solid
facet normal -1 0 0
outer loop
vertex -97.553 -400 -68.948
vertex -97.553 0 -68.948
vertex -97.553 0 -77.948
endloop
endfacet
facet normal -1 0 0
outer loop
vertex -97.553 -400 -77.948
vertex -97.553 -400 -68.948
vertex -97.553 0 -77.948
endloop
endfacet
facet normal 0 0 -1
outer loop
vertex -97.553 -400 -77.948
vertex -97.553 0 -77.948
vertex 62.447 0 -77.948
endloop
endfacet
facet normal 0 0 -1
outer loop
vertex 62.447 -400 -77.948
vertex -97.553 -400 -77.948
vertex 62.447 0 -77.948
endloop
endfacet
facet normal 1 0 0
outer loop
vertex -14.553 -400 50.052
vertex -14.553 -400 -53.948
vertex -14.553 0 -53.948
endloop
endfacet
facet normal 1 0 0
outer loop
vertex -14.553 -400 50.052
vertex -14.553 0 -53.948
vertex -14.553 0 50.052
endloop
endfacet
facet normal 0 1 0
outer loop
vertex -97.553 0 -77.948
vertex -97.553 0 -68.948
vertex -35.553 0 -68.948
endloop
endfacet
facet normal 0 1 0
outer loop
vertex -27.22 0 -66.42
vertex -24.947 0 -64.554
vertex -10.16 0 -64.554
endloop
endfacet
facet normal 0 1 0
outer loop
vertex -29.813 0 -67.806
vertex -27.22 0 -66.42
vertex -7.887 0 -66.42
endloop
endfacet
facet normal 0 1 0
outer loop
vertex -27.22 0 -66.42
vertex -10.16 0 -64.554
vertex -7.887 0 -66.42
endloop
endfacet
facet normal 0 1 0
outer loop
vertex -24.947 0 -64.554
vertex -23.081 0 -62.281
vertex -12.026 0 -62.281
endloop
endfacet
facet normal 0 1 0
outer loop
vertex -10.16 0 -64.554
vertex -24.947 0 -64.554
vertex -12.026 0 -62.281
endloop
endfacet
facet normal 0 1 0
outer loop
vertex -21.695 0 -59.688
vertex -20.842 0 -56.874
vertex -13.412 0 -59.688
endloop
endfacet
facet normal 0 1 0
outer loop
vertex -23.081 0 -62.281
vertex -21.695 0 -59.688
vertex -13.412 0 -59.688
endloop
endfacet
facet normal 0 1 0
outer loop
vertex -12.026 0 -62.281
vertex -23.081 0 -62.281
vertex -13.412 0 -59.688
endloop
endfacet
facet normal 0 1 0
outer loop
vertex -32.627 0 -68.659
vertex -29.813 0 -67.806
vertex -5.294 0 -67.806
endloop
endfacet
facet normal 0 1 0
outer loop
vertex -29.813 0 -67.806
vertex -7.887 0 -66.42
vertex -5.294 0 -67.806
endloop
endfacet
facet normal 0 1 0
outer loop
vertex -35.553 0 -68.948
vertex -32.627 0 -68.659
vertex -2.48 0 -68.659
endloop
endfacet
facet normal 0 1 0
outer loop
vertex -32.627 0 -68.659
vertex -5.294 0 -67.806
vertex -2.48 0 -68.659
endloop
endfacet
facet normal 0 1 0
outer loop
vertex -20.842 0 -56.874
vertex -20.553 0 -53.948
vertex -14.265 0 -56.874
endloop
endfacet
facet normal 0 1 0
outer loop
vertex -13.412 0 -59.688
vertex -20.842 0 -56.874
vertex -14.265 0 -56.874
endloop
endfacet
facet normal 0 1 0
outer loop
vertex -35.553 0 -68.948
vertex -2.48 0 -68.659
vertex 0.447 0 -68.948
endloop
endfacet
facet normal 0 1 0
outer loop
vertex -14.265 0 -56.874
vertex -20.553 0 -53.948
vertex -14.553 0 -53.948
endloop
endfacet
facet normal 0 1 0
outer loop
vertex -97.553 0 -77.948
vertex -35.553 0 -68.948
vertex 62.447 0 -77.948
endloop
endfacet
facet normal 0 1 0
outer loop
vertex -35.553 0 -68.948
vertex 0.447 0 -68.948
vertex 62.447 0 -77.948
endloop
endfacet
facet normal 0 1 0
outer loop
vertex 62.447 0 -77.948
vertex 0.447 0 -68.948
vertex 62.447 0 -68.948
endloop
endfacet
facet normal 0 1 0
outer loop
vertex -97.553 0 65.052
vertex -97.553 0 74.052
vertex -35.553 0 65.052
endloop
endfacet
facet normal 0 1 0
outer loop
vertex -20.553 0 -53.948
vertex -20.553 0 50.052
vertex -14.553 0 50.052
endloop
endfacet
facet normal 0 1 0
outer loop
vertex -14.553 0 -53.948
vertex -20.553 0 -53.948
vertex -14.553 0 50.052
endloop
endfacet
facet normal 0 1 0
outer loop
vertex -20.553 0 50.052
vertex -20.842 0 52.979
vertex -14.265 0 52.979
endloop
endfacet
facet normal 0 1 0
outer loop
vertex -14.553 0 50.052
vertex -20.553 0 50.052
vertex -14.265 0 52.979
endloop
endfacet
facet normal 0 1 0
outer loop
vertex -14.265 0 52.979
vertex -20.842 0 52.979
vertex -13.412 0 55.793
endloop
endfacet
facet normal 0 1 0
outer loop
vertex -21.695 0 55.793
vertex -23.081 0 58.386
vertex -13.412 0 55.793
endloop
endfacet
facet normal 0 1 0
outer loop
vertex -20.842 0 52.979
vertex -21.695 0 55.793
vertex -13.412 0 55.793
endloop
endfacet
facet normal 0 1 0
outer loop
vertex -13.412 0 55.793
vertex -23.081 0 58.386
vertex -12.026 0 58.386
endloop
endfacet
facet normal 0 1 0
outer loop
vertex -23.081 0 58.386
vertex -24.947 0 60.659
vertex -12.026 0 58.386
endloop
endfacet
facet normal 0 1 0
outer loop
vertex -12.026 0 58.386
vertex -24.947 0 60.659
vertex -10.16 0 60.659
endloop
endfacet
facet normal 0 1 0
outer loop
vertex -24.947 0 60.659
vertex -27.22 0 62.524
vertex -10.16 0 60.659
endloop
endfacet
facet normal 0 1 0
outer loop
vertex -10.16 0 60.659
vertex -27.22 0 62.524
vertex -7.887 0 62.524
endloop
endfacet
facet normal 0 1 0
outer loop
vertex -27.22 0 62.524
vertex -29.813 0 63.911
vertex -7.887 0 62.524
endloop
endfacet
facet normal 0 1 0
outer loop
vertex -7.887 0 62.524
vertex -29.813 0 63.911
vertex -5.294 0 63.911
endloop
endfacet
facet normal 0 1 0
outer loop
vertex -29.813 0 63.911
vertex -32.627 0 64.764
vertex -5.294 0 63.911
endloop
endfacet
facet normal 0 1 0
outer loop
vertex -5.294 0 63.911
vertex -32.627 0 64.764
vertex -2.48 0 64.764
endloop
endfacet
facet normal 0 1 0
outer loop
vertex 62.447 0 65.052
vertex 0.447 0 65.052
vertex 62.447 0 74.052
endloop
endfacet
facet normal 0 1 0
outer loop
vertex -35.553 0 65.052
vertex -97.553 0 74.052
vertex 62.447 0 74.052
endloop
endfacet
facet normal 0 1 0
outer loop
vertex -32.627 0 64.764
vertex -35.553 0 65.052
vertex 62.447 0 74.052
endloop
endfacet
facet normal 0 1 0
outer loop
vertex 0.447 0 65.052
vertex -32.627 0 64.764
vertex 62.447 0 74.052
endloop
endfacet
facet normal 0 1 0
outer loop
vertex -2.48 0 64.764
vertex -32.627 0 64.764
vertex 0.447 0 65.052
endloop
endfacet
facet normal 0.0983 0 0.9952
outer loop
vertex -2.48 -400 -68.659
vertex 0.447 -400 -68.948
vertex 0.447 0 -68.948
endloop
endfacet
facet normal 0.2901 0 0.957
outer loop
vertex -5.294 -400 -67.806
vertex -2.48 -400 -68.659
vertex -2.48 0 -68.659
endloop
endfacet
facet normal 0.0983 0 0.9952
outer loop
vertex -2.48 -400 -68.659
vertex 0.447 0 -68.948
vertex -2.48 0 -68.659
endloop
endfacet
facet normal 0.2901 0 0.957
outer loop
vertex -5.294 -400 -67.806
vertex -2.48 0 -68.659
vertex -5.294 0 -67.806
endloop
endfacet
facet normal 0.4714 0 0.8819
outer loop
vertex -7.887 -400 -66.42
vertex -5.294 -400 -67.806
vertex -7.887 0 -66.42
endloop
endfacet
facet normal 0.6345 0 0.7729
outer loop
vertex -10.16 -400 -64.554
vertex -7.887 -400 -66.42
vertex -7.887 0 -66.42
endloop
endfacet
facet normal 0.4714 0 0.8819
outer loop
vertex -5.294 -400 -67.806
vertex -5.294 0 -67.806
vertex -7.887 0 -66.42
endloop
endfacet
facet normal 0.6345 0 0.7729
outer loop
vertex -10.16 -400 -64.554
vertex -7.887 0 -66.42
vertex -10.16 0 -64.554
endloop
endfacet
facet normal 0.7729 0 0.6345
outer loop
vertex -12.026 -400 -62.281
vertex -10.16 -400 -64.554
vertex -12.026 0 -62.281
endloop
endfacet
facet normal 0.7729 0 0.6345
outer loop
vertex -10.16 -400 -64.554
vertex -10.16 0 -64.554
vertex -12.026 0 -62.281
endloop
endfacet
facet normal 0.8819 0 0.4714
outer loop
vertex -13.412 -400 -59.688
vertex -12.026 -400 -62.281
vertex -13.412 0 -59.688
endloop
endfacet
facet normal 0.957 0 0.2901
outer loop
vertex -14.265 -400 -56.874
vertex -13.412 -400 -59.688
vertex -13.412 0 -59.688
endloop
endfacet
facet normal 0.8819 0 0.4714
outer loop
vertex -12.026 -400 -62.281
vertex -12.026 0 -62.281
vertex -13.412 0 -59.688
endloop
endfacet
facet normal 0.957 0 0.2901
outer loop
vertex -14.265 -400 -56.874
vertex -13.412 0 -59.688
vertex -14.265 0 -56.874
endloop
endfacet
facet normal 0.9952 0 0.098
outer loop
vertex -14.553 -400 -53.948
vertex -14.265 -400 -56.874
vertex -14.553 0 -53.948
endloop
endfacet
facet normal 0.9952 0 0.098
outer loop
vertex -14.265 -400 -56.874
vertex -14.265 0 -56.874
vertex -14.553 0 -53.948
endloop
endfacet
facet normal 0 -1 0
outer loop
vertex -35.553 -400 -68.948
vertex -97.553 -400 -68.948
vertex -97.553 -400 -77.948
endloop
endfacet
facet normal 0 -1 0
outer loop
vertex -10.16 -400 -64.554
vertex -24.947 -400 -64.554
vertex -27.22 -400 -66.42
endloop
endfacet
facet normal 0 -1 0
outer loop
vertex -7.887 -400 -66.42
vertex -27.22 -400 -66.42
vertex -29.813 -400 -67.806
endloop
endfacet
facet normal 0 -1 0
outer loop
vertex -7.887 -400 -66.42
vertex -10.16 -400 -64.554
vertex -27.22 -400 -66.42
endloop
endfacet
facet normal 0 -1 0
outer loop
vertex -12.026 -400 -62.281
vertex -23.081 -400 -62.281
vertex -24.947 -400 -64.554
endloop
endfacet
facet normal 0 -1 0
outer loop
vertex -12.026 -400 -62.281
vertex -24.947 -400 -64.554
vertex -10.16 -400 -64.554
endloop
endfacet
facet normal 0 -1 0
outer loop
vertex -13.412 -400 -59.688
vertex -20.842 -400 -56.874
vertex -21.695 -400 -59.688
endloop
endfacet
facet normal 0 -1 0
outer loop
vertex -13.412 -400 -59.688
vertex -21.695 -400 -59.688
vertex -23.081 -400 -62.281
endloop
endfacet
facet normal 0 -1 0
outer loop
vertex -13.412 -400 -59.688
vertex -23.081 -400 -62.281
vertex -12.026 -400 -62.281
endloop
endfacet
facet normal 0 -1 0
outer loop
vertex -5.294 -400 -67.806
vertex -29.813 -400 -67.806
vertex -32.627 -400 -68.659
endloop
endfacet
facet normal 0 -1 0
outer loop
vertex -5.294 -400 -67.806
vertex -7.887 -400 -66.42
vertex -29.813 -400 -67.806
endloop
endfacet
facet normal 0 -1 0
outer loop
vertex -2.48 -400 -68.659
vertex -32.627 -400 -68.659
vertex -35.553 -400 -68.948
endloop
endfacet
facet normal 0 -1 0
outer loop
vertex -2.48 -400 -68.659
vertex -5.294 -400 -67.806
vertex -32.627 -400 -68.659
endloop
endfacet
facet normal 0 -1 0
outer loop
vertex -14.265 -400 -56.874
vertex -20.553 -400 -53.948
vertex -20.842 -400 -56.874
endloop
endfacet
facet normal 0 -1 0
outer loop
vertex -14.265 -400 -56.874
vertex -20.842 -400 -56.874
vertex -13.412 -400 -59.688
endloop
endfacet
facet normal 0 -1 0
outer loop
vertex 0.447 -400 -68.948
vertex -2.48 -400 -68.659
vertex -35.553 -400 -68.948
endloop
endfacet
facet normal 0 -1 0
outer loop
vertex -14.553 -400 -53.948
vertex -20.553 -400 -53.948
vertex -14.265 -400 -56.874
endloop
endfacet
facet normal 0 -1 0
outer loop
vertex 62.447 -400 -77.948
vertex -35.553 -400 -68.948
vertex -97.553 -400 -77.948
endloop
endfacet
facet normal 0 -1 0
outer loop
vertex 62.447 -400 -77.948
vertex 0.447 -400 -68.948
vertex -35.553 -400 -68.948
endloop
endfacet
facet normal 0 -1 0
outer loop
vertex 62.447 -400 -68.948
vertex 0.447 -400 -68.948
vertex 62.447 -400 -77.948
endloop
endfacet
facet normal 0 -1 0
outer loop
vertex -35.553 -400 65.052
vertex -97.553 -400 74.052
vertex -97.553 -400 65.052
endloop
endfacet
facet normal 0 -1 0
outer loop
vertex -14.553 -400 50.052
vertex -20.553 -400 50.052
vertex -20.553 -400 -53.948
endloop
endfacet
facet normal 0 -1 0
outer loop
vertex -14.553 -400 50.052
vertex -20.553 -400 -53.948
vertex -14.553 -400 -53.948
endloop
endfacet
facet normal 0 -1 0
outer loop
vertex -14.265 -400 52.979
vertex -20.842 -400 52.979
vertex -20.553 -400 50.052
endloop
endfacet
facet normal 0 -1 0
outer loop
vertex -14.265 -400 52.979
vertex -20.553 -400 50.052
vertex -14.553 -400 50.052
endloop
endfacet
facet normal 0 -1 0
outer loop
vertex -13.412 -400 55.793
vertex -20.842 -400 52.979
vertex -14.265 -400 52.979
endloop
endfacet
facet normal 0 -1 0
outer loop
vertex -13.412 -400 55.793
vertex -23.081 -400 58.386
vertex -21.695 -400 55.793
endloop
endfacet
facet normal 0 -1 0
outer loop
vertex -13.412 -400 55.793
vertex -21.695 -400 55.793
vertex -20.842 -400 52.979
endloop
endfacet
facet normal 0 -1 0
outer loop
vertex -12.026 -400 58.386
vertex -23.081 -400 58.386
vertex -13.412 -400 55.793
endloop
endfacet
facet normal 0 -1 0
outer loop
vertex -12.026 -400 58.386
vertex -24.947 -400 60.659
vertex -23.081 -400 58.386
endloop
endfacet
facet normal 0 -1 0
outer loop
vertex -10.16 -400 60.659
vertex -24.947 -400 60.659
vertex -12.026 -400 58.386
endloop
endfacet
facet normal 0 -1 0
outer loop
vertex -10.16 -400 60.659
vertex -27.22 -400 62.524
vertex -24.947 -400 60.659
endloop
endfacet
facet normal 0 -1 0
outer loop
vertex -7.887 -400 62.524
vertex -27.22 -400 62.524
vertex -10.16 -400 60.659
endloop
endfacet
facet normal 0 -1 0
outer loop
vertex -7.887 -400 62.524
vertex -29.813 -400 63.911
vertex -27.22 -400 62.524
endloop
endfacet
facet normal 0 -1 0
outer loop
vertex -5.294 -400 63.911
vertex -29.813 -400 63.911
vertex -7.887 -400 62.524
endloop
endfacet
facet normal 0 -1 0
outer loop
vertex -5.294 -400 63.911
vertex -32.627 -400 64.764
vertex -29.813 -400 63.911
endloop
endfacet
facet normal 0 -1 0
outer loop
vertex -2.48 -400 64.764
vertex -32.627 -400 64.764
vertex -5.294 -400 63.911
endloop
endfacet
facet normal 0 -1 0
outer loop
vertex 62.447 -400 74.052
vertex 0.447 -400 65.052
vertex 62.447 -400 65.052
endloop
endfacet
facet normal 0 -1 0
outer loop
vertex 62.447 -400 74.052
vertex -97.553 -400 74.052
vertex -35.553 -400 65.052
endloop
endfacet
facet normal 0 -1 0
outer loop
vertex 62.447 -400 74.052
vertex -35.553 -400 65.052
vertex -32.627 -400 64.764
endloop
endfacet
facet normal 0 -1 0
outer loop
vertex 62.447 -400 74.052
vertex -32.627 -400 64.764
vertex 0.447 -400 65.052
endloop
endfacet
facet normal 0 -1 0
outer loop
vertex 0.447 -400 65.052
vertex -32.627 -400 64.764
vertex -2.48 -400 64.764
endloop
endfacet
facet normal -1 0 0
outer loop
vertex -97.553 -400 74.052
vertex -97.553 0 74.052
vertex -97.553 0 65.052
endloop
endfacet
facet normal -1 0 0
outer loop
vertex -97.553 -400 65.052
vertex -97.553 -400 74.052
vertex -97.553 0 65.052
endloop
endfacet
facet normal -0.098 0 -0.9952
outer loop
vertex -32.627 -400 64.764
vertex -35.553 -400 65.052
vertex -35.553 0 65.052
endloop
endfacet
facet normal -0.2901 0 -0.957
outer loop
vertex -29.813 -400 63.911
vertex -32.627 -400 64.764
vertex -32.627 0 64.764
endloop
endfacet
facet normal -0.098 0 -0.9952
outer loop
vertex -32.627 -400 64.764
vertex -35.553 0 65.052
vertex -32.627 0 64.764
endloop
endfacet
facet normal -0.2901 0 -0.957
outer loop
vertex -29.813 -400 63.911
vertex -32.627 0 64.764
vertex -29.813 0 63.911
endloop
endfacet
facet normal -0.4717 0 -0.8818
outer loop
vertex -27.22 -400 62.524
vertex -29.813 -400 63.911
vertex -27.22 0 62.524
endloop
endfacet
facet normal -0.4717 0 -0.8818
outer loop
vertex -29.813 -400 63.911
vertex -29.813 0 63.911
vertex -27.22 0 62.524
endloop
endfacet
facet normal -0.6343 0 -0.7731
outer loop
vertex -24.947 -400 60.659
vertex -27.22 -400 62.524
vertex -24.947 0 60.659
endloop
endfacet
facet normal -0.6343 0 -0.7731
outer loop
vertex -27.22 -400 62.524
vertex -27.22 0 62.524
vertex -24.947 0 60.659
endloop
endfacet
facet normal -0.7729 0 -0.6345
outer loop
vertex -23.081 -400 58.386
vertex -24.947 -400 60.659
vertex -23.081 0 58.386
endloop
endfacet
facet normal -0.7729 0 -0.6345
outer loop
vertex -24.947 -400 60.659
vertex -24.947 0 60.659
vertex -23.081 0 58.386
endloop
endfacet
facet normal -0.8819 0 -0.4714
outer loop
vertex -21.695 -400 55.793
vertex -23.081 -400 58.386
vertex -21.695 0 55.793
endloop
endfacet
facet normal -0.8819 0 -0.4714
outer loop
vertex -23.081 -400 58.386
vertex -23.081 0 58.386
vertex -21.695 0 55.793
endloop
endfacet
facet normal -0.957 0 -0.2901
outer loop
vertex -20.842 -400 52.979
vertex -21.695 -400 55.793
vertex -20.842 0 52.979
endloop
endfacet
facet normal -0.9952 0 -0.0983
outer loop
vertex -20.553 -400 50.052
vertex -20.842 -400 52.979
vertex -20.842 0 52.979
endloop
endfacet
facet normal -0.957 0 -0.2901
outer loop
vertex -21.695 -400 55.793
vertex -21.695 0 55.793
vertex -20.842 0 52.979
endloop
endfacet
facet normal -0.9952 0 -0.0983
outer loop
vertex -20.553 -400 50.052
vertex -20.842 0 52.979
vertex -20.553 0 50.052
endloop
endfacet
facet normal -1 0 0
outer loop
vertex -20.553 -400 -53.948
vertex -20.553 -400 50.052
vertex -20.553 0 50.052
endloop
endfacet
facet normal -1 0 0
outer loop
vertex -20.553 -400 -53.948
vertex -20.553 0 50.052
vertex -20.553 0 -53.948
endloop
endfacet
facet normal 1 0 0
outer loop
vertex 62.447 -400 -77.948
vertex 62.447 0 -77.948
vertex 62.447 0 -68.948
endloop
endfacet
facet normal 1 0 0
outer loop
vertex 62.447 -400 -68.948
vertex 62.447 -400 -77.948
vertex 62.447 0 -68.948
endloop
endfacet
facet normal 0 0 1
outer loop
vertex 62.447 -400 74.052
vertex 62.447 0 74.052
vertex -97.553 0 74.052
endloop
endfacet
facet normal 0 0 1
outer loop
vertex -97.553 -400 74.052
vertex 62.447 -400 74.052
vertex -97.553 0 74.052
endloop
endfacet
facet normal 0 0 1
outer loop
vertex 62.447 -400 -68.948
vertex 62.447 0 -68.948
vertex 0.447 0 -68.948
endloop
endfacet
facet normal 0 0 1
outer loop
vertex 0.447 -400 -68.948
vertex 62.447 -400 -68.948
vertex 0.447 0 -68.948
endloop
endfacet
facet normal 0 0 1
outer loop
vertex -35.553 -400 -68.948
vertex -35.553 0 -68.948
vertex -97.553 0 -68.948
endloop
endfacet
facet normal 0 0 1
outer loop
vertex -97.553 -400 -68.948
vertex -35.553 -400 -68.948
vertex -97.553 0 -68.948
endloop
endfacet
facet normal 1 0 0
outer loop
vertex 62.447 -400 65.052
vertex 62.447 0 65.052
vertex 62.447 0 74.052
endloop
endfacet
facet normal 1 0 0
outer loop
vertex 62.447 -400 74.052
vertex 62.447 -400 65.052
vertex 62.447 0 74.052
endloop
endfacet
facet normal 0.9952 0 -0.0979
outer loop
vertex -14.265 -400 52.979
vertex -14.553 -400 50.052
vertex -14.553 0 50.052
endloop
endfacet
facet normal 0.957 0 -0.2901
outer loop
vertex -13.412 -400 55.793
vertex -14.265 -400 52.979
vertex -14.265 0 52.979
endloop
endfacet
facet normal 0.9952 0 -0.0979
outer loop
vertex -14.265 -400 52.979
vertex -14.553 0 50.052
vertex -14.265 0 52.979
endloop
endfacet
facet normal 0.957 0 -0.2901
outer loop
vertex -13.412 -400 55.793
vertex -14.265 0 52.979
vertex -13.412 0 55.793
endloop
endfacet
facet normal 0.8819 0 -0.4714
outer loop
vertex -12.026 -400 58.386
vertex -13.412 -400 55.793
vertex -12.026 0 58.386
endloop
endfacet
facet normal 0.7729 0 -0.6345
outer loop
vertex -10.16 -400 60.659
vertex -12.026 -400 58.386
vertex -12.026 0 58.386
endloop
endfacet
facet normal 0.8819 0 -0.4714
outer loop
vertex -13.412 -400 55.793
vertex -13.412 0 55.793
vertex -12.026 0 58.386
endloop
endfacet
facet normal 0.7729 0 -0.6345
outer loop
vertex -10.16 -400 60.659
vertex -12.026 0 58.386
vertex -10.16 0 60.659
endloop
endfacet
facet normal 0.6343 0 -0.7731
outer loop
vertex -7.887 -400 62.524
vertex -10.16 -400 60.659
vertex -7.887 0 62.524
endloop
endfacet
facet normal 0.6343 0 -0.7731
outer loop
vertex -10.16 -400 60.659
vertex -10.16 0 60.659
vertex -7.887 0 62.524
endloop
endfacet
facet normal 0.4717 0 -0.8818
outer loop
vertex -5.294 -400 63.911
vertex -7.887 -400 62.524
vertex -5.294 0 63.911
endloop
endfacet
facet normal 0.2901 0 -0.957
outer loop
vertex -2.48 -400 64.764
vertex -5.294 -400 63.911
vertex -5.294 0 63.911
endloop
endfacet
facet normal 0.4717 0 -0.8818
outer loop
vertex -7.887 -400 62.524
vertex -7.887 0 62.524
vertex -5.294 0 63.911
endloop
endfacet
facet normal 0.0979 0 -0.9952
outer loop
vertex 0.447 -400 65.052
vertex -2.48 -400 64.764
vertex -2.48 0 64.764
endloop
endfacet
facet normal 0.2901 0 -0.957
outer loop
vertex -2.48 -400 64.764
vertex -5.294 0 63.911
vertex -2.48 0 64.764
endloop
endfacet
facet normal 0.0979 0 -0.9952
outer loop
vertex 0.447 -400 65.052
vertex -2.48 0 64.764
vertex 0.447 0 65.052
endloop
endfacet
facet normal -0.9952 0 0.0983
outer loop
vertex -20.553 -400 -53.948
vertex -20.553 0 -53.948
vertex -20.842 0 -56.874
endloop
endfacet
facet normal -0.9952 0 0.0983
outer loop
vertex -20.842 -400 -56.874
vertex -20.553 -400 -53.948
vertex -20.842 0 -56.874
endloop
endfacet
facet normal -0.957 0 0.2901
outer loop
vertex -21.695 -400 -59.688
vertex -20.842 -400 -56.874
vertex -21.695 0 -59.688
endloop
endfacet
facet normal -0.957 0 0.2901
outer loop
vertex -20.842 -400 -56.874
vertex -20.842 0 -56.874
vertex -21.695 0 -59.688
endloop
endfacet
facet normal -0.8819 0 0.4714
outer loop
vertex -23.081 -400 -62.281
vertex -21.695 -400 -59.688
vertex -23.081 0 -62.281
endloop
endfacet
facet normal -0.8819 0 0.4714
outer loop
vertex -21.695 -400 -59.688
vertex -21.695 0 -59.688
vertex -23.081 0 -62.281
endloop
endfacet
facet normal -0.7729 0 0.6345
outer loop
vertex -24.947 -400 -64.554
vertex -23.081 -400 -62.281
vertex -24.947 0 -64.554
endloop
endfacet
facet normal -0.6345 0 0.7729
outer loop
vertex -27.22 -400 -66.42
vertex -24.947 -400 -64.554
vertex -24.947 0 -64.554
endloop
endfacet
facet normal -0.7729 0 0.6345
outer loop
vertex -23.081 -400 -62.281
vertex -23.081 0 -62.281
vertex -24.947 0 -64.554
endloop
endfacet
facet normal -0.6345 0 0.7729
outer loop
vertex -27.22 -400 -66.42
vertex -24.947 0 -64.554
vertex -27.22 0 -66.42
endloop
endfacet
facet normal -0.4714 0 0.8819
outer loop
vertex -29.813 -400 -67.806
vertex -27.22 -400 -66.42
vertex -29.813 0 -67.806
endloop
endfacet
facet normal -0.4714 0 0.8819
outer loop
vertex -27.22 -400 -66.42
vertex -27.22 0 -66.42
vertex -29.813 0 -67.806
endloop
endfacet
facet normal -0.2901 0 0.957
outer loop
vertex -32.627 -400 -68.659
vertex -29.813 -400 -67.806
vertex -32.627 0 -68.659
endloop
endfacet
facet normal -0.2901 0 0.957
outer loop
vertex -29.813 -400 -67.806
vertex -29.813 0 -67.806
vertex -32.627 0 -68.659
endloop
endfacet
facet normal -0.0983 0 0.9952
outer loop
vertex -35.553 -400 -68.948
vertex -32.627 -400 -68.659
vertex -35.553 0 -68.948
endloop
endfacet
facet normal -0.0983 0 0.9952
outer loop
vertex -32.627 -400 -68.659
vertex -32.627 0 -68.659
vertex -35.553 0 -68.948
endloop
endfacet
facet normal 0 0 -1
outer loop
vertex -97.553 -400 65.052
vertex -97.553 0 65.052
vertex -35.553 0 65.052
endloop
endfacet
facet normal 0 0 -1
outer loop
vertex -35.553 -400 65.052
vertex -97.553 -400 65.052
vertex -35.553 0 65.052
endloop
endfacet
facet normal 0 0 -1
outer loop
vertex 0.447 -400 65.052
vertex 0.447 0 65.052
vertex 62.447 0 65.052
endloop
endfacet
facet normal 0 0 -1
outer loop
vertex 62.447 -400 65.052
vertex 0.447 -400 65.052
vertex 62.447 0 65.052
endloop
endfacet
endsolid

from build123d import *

# Parameters (mm, degrees)
F1_DEPTH = 400


with BuildPart() as f1:
    # F0 (on Front) → F1 (new body)
    with BuildSketch(Plane.XZ):
        with BuildLine():
            Line((-35.55349, -68.947688), (-97.55349, -68.947688))
            Line((-97.55349, -68.947688), (-97.55349, -77.947688))
            Line((-97.55349, -77.947688), (62.44651, -77.947688))
            Line((62.44651, -77.947688), (62.44651, -68.947688))
            Line((62.44651, -68.947688), (0.44651, -68.947688))
            ThreePointArc((0.44651, -68.947688), (-10.160092, -64.55429), (-14.55349, -53.947688))
            Line((-14.55349, -53.947688), (-14.55349, 50.052312))
            ThreePointArc((-14.55349, 50.052312), (-10.160092, 60.658913), (0.44651, 65.052312))
            Line((0.44651, 65.052312), (62.44651, 65.052312))
            Line((62.44651, 65.052312), (62.44651, 74.052312))
            Line((62.44651, 74.052312), (-97.55349, 74.052312))
            Line((-97.55349, 74.052312), (-97.55349, 65.052312))
            Line((-97.55349, 65.052312), (-35.55349, 65.052312))
            ThreePointArc((-35.55349, 65.052312), (-24.946889, 60.658913), (-20.55349, 50.052312))
            Line((-20.55349, 50.052312), (-20.55349, -53.947688))
            ThreePointArc((-20.55349, -53.947688), (-24.946889, -64.55429), (-35.55349, -68.947688))
        make_face()
    extrude(amount=F1_DEPTH)


solid = f1.part
